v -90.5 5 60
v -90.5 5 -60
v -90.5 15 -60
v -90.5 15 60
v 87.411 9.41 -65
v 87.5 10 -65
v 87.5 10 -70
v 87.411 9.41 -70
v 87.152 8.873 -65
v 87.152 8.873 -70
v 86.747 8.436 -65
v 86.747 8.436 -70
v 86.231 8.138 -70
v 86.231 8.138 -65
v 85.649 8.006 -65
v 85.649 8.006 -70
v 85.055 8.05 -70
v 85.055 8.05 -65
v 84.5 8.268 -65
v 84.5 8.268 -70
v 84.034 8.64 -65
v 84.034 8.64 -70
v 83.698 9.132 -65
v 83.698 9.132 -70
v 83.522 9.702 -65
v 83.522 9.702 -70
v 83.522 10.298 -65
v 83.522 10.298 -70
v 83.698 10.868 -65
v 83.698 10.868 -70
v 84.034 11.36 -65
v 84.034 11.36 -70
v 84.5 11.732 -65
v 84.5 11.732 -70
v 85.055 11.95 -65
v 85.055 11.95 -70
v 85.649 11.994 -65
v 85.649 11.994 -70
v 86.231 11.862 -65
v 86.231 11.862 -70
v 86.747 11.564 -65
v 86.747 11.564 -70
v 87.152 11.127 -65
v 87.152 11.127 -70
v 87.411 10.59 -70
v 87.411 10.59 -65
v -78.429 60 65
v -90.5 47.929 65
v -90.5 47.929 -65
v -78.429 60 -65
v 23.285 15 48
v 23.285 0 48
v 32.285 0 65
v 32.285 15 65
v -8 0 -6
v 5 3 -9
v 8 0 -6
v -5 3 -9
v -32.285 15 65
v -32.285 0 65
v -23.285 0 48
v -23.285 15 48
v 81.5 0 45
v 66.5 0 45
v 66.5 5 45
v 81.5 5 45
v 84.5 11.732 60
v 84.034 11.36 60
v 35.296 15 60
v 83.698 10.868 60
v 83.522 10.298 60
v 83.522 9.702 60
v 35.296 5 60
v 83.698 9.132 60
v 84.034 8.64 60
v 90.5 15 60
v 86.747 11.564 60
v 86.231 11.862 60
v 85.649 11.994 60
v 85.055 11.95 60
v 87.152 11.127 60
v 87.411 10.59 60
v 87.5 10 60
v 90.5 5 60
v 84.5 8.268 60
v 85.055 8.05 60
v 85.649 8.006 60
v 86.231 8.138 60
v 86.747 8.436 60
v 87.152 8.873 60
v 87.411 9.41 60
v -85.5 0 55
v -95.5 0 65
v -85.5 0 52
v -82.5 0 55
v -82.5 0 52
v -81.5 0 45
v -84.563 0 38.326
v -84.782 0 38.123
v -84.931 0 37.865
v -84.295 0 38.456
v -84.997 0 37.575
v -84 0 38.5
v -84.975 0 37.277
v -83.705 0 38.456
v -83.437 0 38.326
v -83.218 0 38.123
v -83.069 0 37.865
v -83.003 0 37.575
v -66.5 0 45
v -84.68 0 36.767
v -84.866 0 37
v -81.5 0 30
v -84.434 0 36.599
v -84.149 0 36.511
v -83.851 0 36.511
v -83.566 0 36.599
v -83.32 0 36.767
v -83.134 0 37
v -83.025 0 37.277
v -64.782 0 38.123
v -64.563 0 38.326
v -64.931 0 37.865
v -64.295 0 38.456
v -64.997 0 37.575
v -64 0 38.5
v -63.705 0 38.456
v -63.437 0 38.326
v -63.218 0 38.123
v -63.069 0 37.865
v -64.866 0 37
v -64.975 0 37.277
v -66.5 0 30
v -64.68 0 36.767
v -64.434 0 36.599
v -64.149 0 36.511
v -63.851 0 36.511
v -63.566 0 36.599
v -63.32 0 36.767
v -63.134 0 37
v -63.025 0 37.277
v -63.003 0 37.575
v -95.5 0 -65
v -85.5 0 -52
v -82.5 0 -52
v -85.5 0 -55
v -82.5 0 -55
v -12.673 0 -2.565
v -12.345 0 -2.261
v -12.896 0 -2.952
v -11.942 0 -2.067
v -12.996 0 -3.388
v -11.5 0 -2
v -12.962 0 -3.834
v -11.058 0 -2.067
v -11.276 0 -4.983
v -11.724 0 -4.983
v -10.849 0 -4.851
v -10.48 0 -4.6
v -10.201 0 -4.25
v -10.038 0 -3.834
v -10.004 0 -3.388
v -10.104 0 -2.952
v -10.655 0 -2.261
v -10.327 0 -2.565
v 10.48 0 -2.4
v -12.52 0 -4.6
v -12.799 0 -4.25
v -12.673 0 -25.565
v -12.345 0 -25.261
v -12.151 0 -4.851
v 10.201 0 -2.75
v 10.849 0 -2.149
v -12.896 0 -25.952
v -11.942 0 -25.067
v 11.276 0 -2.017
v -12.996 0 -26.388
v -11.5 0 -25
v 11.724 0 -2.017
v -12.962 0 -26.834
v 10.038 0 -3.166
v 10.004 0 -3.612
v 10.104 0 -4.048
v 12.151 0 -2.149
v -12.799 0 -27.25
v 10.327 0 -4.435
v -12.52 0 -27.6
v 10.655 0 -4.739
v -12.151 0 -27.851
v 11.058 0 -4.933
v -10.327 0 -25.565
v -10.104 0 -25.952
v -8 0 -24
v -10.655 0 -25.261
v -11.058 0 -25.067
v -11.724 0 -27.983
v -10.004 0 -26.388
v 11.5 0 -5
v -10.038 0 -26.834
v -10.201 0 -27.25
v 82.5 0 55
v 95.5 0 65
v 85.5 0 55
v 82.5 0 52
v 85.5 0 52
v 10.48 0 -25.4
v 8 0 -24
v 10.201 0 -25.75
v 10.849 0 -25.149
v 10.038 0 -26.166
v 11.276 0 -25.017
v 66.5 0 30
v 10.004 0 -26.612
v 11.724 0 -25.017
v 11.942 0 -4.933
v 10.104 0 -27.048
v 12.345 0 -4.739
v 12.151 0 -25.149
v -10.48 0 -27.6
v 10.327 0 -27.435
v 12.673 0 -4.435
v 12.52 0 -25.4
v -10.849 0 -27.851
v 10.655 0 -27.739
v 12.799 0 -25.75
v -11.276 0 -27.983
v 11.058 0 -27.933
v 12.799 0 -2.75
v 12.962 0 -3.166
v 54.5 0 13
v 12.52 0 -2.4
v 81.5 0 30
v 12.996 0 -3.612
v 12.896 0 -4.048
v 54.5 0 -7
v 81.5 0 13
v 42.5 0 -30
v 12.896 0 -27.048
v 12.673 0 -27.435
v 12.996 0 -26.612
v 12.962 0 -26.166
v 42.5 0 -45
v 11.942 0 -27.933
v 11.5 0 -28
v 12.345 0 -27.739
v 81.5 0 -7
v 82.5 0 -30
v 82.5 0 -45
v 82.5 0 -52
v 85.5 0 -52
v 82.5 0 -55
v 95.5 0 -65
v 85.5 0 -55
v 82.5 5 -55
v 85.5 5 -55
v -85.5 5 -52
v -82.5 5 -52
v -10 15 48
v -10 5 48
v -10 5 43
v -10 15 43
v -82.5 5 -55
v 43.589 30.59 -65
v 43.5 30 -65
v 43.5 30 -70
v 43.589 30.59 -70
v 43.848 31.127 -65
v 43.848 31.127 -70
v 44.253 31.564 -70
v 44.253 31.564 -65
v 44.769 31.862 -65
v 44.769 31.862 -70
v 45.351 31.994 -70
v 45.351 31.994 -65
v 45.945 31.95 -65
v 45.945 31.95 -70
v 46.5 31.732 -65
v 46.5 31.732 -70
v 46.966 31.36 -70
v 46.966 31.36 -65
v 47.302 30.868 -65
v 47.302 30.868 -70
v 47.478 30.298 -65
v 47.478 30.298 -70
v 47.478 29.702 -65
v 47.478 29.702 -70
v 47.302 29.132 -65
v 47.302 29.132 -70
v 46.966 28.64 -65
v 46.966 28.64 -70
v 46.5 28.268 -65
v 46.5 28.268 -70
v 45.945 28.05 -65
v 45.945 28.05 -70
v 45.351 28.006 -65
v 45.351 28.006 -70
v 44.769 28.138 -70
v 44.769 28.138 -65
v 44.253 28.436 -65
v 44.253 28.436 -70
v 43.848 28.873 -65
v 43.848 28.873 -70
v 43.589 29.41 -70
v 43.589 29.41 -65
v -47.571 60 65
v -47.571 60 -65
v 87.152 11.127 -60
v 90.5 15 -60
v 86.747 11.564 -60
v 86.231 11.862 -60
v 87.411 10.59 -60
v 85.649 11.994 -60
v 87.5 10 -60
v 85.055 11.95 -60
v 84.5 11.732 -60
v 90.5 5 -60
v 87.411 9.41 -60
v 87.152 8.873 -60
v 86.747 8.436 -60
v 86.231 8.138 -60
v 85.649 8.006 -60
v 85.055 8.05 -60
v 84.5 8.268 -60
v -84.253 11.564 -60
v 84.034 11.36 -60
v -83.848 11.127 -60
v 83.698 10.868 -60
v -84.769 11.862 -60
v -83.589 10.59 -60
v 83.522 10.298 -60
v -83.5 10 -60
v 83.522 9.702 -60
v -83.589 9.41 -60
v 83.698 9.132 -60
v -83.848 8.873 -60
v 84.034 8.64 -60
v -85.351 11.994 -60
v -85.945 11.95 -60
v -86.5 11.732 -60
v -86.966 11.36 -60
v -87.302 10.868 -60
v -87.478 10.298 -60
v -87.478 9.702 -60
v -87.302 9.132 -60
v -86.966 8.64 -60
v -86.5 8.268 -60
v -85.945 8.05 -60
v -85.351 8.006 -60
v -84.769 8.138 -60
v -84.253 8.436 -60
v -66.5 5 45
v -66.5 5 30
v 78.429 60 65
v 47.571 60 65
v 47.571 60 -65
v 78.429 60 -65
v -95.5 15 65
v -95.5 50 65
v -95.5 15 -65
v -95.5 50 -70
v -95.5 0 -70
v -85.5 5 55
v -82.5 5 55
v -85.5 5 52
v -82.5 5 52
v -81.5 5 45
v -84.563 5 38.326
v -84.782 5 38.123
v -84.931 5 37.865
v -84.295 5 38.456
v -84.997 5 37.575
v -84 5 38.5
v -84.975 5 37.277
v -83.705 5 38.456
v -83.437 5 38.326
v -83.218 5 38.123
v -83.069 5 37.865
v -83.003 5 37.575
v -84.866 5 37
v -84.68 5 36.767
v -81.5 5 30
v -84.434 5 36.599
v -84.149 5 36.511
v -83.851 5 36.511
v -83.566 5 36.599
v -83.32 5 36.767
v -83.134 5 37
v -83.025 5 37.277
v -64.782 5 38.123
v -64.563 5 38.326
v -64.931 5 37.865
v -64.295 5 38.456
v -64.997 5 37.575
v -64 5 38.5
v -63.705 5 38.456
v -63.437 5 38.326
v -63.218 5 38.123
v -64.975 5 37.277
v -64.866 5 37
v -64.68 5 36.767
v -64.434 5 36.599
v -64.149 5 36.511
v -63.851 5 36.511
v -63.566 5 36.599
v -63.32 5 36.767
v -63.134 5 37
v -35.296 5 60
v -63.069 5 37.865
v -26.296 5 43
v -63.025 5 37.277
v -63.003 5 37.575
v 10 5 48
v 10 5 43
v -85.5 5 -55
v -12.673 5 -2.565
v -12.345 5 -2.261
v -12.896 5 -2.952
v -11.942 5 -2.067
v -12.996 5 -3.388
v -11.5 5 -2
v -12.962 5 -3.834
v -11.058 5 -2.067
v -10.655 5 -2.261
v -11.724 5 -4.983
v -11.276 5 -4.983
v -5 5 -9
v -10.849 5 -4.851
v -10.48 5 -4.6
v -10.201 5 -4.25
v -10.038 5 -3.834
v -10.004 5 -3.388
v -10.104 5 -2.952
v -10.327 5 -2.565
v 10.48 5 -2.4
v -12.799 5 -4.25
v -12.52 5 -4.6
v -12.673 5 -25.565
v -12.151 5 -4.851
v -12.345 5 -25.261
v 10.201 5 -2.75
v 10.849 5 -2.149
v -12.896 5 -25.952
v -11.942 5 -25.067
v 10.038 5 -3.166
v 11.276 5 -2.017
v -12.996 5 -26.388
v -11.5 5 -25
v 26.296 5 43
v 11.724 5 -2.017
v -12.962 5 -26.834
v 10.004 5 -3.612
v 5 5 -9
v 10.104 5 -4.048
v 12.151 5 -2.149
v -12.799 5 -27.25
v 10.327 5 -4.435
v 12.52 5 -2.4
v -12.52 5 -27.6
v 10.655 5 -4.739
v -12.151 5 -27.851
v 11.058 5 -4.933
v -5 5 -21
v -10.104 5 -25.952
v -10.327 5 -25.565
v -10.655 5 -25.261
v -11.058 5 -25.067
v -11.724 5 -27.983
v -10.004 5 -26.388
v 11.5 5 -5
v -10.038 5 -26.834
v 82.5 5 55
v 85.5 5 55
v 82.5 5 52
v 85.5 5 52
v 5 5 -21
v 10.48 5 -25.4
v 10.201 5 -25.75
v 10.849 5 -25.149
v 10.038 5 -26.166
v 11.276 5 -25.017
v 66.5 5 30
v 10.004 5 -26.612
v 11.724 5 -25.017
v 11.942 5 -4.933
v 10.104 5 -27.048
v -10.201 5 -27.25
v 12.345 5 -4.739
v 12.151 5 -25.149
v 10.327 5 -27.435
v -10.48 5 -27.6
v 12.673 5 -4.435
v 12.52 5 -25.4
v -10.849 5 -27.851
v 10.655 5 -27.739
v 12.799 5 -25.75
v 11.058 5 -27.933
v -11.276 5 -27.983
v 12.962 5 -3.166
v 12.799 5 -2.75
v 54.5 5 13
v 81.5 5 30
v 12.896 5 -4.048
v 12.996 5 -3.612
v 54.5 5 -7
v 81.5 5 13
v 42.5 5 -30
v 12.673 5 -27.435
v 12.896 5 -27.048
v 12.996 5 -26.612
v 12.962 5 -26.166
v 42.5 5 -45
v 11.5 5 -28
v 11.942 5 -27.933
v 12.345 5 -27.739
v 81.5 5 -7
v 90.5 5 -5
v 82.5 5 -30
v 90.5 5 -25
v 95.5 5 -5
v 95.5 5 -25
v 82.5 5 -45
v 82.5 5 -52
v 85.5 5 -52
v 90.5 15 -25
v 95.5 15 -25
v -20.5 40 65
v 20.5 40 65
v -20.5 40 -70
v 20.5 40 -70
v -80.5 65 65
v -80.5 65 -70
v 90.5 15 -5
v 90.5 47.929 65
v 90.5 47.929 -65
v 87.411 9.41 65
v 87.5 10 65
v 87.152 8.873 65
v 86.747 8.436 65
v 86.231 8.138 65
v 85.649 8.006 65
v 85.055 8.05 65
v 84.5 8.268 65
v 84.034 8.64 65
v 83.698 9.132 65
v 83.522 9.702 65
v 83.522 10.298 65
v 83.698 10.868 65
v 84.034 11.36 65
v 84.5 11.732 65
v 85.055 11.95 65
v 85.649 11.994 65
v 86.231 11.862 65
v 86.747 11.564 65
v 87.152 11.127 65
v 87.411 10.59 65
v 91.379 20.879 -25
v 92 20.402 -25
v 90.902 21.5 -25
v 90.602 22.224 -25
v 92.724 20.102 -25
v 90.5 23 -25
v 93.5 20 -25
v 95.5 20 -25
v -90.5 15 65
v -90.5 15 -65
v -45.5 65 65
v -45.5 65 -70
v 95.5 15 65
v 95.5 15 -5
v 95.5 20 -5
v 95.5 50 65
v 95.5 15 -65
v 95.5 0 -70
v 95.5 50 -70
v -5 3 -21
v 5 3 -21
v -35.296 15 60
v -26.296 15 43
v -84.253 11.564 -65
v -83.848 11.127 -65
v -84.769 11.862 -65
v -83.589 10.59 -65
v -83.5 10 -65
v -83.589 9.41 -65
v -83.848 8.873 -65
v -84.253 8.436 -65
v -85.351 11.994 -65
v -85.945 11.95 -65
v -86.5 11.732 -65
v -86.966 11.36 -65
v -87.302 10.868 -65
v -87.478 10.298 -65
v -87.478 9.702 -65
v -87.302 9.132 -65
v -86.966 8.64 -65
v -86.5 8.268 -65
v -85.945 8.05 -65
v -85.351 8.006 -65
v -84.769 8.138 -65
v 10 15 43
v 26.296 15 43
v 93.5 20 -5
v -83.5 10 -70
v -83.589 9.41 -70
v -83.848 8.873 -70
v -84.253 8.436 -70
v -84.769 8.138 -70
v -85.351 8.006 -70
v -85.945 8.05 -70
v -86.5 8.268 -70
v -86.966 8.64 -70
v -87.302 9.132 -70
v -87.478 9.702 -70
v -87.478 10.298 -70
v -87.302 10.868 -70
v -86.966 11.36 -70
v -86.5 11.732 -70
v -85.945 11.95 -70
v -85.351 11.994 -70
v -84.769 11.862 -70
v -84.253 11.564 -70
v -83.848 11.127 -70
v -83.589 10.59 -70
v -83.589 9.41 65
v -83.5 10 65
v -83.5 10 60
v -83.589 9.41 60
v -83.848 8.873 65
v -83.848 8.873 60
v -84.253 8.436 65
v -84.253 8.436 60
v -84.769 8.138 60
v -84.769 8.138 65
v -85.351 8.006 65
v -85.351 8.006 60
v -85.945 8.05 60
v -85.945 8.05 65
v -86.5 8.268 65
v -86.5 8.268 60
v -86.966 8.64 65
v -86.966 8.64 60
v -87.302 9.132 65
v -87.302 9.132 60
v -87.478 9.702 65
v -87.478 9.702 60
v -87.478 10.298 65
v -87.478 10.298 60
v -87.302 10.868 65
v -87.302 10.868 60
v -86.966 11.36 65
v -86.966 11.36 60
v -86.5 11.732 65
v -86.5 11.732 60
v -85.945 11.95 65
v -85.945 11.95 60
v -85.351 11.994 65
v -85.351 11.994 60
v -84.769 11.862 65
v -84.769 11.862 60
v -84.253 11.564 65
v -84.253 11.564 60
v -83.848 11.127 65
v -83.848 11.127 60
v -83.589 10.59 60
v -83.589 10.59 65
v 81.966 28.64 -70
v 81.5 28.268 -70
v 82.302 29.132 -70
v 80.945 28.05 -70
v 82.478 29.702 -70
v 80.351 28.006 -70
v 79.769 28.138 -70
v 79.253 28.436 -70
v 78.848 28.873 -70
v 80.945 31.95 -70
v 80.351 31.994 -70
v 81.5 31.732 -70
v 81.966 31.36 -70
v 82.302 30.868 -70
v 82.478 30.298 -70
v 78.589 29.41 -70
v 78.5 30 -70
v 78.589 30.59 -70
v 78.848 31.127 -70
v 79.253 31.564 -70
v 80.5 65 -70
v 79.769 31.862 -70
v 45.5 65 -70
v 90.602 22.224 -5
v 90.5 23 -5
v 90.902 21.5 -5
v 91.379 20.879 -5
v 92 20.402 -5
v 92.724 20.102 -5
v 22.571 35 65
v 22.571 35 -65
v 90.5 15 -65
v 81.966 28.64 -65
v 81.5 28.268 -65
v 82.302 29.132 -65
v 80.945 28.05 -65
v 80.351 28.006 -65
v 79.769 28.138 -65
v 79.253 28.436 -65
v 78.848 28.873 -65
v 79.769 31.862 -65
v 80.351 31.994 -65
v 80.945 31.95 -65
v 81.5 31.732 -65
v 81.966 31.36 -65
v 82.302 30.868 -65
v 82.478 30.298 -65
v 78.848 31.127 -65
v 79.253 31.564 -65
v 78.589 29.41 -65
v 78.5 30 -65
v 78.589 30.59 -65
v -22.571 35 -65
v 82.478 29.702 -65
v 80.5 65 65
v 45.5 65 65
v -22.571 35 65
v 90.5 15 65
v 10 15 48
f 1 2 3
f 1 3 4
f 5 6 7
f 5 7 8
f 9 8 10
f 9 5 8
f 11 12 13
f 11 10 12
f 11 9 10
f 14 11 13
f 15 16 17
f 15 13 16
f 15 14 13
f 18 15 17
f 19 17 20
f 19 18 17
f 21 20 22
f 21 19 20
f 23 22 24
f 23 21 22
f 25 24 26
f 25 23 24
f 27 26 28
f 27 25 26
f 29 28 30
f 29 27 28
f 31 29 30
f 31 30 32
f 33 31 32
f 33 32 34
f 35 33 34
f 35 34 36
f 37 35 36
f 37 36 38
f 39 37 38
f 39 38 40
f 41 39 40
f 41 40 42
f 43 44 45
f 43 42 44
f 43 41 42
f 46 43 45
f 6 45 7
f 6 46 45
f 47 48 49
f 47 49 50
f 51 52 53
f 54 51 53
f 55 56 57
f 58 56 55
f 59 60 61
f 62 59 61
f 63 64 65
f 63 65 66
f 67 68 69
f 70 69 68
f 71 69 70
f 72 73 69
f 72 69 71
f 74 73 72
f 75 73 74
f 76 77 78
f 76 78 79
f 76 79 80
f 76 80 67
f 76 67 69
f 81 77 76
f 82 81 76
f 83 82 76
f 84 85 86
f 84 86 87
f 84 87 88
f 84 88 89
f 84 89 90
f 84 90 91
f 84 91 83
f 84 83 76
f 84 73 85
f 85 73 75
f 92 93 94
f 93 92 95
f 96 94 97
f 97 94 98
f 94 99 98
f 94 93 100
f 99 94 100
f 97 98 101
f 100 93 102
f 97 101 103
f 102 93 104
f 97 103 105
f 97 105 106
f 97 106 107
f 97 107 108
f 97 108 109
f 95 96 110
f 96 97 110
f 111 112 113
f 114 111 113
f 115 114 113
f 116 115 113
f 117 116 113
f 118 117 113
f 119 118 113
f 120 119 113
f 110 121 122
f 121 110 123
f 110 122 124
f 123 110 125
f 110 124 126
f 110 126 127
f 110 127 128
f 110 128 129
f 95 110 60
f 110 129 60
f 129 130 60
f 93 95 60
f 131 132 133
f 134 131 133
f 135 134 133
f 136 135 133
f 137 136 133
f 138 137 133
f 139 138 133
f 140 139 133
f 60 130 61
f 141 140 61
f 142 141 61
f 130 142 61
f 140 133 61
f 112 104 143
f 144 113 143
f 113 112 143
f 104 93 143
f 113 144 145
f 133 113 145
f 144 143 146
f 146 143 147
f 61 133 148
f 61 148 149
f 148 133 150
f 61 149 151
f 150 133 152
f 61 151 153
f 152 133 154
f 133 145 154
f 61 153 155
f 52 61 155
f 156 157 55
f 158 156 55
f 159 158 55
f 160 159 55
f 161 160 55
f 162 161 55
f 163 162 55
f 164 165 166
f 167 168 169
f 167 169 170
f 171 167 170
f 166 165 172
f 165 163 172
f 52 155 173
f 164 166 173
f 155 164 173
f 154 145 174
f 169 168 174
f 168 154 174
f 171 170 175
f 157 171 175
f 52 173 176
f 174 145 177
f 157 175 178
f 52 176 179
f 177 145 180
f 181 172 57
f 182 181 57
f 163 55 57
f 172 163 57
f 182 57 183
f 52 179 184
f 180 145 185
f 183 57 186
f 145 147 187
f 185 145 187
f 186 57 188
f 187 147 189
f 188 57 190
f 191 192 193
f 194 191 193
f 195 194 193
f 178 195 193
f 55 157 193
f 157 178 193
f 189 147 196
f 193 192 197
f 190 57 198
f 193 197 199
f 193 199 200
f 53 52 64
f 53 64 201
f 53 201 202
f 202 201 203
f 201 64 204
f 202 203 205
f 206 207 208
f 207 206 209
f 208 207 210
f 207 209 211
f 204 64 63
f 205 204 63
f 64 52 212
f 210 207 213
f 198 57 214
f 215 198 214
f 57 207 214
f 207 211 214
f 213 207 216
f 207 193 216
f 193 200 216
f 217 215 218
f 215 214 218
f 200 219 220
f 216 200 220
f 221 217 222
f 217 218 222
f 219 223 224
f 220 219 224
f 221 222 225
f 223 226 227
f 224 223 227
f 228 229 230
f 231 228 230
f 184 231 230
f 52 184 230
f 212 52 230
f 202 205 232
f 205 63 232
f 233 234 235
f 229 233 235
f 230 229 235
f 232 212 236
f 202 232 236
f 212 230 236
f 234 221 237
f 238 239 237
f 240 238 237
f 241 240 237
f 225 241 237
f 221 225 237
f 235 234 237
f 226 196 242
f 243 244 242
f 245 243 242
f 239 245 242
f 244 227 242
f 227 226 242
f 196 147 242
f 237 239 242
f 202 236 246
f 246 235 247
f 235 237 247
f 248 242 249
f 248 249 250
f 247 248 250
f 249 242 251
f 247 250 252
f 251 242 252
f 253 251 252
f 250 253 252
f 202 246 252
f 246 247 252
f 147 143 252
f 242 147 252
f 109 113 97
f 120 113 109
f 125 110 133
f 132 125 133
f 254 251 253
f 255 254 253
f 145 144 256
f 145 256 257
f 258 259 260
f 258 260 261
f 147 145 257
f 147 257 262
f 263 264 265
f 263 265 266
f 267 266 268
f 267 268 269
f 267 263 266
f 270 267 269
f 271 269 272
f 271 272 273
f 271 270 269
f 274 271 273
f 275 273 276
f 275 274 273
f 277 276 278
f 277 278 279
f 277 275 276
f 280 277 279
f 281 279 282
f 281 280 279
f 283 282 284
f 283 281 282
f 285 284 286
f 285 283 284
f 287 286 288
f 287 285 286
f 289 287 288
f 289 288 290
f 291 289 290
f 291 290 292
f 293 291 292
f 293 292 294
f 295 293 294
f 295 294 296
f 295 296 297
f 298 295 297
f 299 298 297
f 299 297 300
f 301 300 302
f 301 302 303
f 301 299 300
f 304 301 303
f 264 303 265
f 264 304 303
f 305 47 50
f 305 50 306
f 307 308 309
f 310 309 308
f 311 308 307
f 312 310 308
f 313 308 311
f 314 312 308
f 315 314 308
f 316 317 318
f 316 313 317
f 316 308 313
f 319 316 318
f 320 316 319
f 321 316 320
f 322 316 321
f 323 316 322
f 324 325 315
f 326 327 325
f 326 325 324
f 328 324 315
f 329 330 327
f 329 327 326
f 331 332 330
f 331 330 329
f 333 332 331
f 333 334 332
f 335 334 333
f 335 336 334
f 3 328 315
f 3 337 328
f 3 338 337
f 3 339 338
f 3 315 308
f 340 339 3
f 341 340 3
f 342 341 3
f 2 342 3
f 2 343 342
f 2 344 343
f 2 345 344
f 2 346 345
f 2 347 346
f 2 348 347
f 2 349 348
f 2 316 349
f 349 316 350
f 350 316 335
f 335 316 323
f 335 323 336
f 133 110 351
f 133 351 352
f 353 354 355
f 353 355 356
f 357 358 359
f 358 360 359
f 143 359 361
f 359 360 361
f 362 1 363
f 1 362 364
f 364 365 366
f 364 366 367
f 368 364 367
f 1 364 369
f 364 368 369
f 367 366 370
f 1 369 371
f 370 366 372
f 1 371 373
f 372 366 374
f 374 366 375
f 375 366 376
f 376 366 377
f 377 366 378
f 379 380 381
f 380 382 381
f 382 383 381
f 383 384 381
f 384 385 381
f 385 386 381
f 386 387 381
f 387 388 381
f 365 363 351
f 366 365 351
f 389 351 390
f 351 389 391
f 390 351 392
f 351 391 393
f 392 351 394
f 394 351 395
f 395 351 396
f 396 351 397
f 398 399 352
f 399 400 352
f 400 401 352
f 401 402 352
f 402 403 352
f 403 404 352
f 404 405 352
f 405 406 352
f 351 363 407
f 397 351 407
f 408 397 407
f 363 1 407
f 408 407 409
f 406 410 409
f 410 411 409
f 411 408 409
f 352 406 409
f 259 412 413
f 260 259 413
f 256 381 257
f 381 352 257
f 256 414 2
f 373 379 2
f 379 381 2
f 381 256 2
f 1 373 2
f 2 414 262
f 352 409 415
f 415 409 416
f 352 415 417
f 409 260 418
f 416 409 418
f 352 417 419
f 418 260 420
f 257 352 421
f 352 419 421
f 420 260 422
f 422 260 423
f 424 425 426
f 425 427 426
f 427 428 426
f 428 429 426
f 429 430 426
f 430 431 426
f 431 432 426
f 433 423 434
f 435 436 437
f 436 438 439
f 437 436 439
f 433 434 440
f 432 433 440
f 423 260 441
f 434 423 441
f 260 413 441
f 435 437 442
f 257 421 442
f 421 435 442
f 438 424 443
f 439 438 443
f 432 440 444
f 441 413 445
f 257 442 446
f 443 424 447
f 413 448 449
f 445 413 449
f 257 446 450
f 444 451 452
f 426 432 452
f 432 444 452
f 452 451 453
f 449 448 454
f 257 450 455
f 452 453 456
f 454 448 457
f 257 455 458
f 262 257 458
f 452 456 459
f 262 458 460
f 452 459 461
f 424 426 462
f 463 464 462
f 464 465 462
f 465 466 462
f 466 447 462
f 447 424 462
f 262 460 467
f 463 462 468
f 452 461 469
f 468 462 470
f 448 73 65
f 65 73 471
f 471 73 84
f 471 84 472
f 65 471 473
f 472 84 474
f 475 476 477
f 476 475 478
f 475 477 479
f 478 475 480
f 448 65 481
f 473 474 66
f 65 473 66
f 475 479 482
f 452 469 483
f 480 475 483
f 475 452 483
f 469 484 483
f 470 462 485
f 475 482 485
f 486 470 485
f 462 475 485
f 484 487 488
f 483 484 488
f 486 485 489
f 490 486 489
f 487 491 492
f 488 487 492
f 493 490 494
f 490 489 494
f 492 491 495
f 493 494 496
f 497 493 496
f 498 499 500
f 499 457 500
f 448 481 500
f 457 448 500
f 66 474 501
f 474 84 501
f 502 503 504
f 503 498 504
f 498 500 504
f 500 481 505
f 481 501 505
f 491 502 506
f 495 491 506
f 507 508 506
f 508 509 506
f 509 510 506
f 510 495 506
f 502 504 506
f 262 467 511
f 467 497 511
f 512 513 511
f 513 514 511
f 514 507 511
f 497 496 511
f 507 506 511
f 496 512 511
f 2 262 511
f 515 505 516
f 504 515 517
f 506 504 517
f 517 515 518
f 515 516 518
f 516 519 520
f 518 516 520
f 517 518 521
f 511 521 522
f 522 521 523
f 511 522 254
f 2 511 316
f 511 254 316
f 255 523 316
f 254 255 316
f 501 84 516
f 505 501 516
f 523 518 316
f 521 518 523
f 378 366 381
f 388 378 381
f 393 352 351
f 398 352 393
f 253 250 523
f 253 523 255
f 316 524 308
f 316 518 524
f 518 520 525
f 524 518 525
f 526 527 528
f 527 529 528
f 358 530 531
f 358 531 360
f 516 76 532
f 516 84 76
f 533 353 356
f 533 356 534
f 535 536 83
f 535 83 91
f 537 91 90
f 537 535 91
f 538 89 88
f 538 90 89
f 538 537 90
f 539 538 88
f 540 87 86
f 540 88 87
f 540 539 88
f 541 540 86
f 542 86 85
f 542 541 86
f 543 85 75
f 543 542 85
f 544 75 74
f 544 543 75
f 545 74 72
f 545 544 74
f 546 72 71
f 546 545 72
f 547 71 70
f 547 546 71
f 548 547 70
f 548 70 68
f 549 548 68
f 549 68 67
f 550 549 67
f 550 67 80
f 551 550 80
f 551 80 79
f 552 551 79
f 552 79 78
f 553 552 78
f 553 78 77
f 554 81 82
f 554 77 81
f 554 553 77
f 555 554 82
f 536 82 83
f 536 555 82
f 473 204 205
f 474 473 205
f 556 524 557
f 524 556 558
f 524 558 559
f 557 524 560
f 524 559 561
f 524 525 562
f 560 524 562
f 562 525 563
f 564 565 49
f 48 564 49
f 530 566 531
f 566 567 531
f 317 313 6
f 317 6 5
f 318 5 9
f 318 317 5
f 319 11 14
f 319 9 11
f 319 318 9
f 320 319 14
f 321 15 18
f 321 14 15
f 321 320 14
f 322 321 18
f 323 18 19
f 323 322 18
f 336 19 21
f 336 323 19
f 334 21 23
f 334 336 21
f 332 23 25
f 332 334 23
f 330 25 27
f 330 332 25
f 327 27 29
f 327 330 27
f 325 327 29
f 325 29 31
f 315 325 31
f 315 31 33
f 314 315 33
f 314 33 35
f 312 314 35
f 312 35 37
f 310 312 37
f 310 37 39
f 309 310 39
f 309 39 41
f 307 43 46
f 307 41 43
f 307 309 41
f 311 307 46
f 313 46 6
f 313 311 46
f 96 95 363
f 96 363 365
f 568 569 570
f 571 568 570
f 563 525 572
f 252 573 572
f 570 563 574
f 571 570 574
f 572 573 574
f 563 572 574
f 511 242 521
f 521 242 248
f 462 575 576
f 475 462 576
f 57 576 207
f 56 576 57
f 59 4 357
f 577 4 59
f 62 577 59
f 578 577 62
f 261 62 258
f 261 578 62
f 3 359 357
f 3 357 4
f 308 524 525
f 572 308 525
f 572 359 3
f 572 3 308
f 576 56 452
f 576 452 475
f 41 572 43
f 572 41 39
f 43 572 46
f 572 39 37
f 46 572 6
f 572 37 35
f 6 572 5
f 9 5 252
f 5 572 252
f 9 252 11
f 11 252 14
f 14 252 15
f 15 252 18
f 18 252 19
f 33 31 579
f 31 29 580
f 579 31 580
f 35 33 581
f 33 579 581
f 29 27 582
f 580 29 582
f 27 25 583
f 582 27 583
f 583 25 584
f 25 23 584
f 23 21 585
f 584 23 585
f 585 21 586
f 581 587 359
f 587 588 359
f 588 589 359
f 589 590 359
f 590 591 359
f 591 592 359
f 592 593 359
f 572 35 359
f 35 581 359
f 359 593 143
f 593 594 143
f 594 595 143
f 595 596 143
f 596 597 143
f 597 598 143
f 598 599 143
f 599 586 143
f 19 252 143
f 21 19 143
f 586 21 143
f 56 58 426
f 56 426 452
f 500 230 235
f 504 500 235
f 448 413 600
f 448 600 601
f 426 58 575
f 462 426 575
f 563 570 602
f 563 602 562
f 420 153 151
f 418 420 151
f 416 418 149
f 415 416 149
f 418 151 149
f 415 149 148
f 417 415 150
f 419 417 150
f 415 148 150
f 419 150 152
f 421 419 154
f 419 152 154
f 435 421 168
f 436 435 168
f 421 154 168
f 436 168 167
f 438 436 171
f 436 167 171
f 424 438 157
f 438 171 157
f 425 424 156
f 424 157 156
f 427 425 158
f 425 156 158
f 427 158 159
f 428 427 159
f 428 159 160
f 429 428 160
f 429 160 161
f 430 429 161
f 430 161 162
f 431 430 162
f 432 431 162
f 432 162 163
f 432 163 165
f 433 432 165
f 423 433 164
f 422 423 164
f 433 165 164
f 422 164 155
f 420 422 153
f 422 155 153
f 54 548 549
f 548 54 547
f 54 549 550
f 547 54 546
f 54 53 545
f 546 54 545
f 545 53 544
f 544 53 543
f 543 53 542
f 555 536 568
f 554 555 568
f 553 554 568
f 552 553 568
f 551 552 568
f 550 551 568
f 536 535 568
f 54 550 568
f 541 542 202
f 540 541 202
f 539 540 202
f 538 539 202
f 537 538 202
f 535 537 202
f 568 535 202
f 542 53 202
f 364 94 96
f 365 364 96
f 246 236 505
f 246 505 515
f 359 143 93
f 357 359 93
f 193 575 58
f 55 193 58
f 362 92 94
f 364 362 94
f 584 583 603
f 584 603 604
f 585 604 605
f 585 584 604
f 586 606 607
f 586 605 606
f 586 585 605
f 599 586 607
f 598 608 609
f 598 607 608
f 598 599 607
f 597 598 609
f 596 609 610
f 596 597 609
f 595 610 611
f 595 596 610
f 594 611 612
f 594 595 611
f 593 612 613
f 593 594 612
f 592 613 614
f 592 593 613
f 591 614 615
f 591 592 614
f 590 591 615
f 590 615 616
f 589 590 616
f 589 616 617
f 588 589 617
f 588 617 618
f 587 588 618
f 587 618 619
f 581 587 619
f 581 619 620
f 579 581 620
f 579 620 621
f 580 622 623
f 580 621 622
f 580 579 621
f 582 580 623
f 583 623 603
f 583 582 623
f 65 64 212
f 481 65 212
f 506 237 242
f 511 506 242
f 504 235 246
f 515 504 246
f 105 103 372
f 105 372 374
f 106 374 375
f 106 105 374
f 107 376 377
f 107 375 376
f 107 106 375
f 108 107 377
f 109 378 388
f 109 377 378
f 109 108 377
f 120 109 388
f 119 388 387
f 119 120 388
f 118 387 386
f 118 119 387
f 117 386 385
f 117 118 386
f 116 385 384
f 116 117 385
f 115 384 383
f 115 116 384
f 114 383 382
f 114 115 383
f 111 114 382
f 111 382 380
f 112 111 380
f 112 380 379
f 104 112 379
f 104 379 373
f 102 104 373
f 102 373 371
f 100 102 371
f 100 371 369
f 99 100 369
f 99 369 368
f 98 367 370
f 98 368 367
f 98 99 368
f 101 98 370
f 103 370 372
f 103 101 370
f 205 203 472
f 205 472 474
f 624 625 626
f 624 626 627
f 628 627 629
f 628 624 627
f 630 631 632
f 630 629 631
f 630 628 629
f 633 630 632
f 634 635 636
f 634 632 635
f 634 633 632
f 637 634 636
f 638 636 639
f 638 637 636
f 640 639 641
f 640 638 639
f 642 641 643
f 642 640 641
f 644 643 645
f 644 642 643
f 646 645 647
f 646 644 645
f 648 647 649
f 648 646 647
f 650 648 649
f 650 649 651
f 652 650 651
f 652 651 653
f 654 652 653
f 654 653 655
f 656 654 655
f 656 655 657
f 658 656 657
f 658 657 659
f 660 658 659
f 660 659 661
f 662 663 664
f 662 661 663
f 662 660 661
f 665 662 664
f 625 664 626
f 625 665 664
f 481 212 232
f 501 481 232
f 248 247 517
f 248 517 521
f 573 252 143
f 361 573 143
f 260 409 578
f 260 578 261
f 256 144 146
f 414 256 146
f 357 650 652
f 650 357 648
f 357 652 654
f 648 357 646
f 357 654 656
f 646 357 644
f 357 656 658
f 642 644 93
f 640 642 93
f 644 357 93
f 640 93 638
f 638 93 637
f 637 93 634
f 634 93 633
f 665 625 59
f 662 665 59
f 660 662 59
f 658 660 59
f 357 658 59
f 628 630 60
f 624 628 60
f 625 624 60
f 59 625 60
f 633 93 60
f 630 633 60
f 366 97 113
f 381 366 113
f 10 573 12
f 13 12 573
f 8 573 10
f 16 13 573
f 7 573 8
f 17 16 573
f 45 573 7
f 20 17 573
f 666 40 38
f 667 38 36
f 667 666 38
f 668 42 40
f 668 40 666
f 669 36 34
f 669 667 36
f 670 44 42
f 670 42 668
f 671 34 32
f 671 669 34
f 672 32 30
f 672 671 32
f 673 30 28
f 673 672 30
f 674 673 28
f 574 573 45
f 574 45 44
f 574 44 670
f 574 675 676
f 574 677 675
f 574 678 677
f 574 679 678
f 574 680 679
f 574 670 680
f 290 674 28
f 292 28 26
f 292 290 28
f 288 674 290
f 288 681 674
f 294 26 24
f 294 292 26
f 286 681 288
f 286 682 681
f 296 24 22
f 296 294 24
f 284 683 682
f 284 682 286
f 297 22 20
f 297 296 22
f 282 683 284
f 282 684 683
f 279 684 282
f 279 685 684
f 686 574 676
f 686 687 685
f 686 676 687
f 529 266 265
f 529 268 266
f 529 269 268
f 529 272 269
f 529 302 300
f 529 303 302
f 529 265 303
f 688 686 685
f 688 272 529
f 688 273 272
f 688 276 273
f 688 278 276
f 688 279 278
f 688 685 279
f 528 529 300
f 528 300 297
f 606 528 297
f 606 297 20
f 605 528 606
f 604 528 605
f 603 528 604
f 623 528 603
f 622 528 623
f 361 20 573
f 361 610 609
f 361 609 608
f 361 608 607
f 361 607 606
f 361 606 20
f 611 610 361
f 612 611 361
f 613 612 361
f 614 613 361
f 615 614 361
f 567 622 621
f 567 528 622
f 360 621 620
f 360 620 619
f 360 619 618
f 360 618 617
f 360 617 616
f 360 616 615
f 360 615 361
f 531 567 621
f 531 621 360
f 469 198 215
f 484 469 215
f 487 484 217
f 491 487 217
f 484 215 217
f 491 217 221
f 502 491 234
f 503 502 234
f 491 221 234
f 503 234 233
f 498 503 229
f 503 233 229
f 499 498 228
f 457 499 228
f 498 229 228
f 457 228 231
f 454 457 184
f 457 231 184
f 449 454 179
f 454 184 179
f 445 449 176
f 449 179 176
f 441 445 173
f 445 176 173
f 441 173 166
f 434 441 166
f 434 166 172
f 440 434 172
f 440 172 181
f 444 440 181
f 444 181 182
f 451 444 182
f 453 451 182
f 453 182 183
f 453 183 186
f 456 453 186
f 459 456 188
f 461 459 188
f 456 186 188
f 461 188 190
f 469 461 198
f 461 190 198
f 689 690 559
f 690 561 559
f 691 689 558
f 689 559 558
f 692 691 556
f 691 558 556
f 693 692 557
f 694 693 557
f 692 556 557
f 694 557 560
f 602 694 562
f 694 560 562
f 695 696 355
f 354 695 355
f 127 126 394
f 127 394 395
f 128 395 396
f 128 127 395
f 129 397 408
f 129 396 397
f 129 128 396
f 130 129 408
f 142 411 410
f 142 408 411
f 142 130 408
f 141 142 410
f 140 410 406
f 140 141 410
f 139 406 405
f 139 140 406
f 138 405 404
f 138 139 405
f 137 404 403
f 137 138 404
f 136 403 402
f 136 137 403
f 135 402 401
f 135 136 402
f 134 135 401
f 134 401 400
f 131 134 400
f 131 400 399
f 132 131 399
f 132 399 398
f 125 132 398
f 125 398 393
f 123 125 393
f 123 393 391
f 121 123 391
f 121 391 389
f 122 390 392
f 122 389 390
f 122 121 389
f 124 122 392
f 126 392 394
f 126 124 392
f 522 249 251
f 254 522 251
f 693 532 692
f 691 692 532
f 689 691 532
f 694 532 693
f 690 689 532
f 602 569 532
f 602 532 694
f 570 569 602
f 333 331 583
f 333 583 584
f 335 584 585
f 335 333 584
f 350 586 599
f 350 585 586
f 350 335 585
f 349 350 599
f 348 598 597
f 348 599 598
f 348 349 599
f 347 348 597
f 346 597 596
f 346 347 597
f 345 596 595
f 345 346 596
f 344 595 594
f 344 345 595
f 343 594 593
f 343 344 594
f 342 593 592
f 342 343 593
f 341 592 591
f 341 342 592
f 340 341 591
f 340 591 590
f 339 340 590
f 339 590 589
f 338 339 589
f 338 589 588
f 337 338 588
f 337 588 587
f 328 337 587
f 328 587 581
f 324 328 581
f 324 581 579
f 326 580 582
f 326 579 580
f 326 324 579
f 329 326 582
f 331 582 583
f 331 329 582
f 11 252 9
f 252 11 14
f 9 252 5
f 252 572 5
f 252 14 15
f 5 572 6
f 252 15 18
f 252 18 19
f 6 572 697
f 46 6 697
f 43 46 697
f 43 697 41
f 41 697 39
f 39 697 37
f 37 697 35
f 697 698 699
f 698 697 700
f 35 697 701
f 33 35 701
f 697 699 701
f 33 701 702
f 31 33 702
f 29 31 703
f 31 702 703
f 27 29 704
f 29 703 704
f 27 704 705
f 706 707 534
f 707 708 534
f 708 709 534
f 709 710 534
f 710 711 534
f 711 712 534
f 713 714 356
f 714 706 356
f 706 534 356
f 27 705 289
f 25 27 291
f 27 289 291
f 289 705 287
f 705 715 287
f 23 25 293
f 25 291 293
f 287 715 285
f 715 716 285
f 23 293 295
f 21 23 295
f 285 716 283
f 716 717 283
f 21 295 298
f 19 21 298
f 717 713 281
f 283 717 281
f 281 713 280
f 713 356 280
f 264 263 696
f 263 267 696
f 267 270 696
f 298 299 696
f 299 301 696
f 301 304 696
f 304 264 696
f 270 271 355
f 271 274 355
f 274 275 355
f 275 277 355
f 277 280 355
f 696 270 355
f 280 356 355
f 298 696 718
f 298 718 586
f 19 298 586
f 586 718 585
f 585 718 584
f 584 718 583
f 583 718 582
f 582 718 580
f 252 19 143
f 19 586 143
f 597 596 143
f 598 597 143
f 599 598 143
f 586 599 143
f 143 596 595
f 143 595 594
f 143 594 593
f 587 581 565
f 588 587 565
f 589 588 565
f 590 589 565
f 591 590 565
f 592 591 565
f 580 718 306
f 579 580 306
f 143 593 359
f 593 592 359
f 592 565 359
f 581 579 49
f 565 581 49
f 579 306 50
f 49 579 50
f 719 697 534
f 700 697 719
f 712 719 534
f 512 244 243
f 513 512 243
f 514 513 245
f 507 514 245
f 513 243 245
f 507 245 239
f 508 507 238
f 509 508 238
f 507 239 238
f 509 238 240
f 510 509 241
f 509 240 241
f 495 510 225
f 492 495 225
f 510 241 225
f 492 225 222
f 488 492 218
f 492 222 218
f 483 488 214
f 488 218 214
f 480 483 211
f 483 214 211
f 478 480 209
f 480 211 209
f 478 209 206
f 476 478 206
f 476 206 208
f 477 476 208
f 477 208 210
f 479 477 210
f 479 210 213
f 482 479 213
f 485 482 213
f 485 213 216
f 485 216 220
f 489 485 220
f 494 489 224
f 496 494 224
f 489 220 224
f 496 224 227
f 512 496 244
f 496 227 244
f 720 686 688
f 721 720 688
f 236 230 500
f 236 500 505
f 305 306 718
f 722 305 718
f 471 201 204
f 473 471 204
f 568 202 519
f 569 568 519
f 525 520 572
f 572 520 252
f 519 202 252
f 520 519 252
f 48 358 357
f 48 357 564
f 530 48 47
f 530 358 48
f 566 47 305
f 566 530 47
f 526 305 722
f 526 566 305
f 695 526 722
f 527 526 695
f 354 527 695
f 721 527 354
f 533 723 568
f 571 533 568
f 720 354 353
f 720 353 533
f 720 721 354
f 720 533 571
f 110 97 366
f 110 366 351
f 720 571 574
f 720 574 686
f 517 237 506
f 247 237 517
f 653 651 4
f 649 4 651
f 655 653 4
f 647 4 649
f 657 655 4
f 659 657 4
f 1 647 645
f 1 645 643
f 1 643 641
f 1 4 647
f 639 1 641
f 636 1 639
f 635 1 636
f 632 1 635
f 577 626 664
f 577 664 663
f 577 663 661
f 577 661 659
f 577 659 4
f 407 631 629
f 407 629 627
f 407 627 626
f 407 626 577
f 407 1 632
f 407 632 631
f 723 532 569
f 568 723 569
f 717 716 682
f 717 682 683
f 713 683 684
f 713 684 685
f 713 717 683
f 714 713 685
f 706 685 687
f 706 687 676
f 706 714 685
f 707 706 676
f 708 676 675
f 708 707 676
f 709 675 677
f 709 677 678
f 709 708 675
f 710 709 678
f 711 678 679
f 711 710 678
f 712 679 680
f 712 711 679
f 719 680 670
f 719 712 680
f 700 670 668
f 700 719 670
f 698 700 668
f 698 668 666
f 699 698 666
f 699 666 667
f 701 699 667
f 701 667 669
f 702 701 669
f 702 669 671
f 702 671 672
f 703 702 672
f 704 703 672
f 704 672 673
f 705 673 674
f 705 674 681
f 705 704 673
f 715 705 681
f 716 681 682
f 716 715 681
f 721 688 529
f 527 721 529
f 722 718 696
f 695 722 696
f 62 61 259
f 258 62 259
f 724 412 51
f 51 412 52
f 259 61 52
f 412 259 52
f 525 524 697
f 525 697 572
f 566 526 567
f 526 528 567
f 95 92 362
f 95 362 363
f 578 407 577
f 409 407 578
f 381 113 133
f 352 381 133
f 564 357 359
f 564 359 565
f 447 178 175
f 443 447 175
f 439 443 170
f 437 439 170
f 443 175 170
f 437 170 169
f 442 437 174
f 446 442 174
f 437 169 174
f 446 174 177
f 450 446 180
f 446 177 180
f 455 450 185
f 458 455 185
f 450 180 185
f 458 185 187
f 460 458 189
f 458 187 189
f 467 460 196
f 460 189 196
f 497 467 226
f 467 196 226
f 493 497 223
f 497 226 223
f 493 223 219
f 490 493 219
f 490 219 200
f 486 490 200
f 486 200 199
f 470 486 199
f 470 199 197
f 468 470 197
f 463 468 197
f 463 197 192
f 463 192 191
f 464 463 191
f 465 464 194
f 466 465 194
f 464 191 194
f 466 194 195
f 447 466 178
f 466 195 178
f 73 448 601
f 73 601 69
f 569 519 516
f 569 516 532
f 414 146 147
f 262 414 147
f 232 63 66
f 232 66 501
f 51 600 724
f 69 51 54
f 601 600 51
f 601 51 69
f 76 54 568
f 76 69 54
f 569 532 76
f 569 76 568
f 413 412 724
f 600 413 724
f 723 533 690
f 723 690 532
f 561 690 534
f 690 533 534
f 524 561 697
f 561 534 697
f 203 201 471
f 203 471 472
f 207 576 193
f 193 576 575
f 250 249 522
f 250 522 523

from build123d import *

# Parameters (mm, degrees)
BOSS_EXTRUDE2_DEPTH     = 15
SHELL1_T                = -5
CUT_EXTRUDE2_DEPTH      = 117.491415993
CUT_EXTRUDE2_DEPTH_BACK = 117.491415993
SKETCH4_R               = 1
SKETCH4_W               = 10
SKETCH4_H               = 12
SKETCH4_W_2             = 27
SKETCH4_H_2             = 20
SKETCH4_W_3             = 15
SKETCH4_H_3             = 15
SKETCH4_W_4             = 40
SKETCH5_W               = 3
SKETCH5_H               = 3
CUT_EXTRUDE4_DEPTH      = 117.491415993
SKETCH6_R               = 2
BOSS_EXTRUDE3_DEPTH     = 5
CUT_EXTRUDE5_DEPTH      = 178.68019023
CUT_EXTRUDE5_DEPTH_BACK = 178.68019023
SKETCH7_R               = 2
BOSS_EXTRUDE4_DEPTH     = 130
CHAMFER2_SIZE           = 3
SKETCH10_R              = 1.5
CUT_EXTRUDE6_DEPTH      = 5
SKETCH11_W              = 20
SKETCH11_H              = 10
CUT_EXTRUDE7_DEPTH      = 5
SKETCH12_W              = 20
SKETCH12_H              = 15
CUT_EXTRUDE8_DEPTH      = 6
FILLET1_R               = 3


with BuildPart() as part:
    # Sketch3 → Boss-Extrude2 (new body)
    with BuildSketch(Plane(origin=(0, 0, 0), x_dir=(1, 0, 0), z_dir=(0, 1, 0))):
        Polygon((95.5, 65), (-95.5, 65), (-95.5, -65), (-32.285430092, -65), (-23.285430092, -48), (23.285430092, -48), (32.285430092, -65), (95.5, -65), align=None)
    extrude(amount=BOSS_EXTRUDE2_DEPTH)

    # Shell1
    shell1_openings = [part.faces().sort_by_distance(p)[0] for p in [
        (0, 15, -2.252821678),
    ]]
    offset(amount=SHELL1_T, openings=shell1_openings, kind=Kind.INTERSECTION)

    # Sketch4 → Cut-Extrude2 (cut, two sides: drawn at the far end of the back side and taken through both)
    with BuildSketch(Plane(origin=(0, 0, 0), x_dir=(1, 0, 0), z_dir=(0, 1, 0)).offset(-CUT_EXTRUDE2_DEPTH_BACK)):
        with Locations(Location((-84, -37.5, 0), (0, 0, 270))):
            Circle(SKETCH4_R)
        with Locations(Location((-64, -37.5, 0), (0, 0, 270))):
            Circle(SKETCH4_R)
        with Locations((0, 15)):
            Rectangle(SKETCH4_W, SKETCH4_H)
        with Locations((68, -3)):
            Rectangle(SKETCH4_W_2, SKETCH4_H_2)
        with Locations((74, -37.5)):
            Rectangle(SKETCH4_W_3, SKETCH4_H_3)
        with Locations((-74, -37.5)):
            Rectangle(SKETCH4_W_3, SKETCH4_H_3)
        with Locations((62.5, 37.5)):
            Rectangle(SKETCH4_W_4, SKETCH4_H_3)
    extrude(amount=CUT_EXTRUDE2_DEPTH + CUT_EXTRUDE2_DEPTH_BACK, mode=Mode.SUBTRACT)

    # Sketch5 → Cut-Extrude4 (cut, through all)
    with BuildSketch(Plane(origin=(0, 0, 0), x_dir=(1, 0, 0), z_dir=(0, 1, 0))):
        with Locations((-84, 53.5)):
            Rectangle(SKETCH5_W, SKETCH5_H)
        with Locations((84, 53.5)):
            Rectangle(SKETCH5_W, SKETCH5_H)
        with Locations((84, -53.5)):
            Rectangle(SKETCH5_W, SKETCH5_H)
        with Locations((-84, -53.5)):
            Rectangle(SKETCH5_W, SKETCH5_H)
    extrude(amount=CUT_EXTRUDE4_DEPTH, mode=Mode.SUBTRACT)


with BuildPart() as body_2:
    # Sketch6 → Boss-Extrude3 (new body)
    with BuildSketch(Plane(origin=(0, 0, -65), x_dir=(-1, 0, 0), z_dir=(0, 0, -1))):
        Polygon((-95.5, 50), (-95.5, 0), (95.5, 0), (95.5, 50), (80.5, 65), (45.5, 65), (20.5, 40), (-20.5, 40), (-45.5, 65), (-80.5, 65), align=None)
        with Locations((-80.5, 30)):
            Circle(SKETCH6_R, mode=Mode.SUBTRACT)
        with Locations((-45.5, 30)):
            Circle(SKETCH6_R, mode=Mode.SUBTRACT)
    extrude(amount=BOSS_EXTRUDE3_DEPTH)


with BuildPart() as cut_extrude5_tool:
    # Sketch7 → Cut-Extrude5 (new, two sides: drawn at the far end of the back side and taken through both)
    with BuildSketch(Plane(origin=(0, 0, -70), x_dir=(-1, 0, 0), z_dir=(0, 0, -1)).offset(-CUT_EXTRUDE5_DEPTH_BACK)):
        with Locations(Location((-85.5, 10, 0), (0, 0, 180))):
            Circle(SKETCH7_R)
        with Locations(Location((85.5, 10, 0), (0, 0, 180))):
            Circle(SKETCH7_R)
    extrude(amount=CUT_EXTRUDE5_DEPTH + CUT_EXTRUDE5_DEPTH_BACK)


with BuildPart() as part_1:
    add(part.part)

    # Cut-Extrude5: cut by cut_extrude5_tool
    add(cut_extrude5_tool.part, mode=Mode.SUBTRACT)

    # Chamfer2
    chamfer2_edges = [part_1.edges().sort_by_distance(p)[0] for p in [
        (-5, 0, -15),
        (0, 0, -21),
        (5, 0, -15),
        (0, 0, -9),
    ]]
    chamfer(chamfer2_edges, length=CHAMFER2_SIZE)

    # Sketch10 → Cut-Extrude6 (cut)
    with BuildSketch(Plane.XZ):
        with Locations(Location((11.5, -3.5, 0), (0, 0, 270))):
            Circle(SKETCH10_R)
        with Locations(Location((11.5, -26.5, 0), (0, 0, 270))):
            Circle(SKETCH10_R)
        with Locations(Location((-11.5, -26.5, 0), (0, 0, 90))):
            Circle(SKETCH10_R)
        with Locations(Location((-11.5, -3.5, 0), (0, 0, 90))):
            Circle(SKETCH10_R)
    extrude(amount=-CUT_EXTRUDE6_DEPTH, mode=Mode.SUBTRACT)

    # Sketch11 → Cut-Extrude7 (cut)
    with BuildSketch(Plane.XY.offset(48)):
        with Locations((0, 10)):
            Rectangle(SKETCH11_W, SKETCH11_H)
    extrude(amount=-CUT_EXTRUDE7_DEPTH, mode=Mode.SUBTRACT)


with BuildPart() as body_2_1:
    add(body_2.part)

    # Cut-Extrude5: cut by cut_extrude5_tool
    add(cut_extrude5_tool.part, mode=Mode.SUBTRACT)

    # Sketch8 → Boss-Extrude4 (add)
    with BuildSketch(Plane.XY.offset(-65)):
        Polygon((45.5, 65), (20.5, 40), (-20.5, 40), (-45.5, 65), (-80.5, 65), (-95.5, 50), (-95.5, 15), (-90.5, 15), (-90.5, 47.928932188), (-78.428932188, 60), (-47.571067812, 60), (-22.571067812, 35), (22.571067812, 35), (47.571067812, 60), (78.428932188, 60), (90.5, 47.928932188), (90.5, 15), (95.5, 15), (95.5, 50), (80.5, 65), align=None)
    extrude(amount=BOSS_EXTRUDE4_DEPTH)


with BuildPart() as cut_extrude8_tool:
    # Sketch12 → Cut-Extrude8 (new body)
    with BuildSketch(Plane(origin=(95.5, 0, 0), x_dir=(0, 0, -1), z_dir=(1, 0, 0))):
        with Locations((15, 12.5)):
            Rectangle(SKETCH12_W, SKETCH12_H)
    extrude(amount=-CUT_EXTRUDE8_DEPTH)


with BuildPart() as part_2:
    add(part_1.part)

    # Cut-Extrude8: cut by cut_extrude8_tool
    add(cut_extrude8_tool.part, mode=Mode.SUBTRACT)


with BuildPart() as body_2_2:
    add(body_2_1.part)

    # Cut-Extrude8: cut by cut_extrude8_tool
    add(cut_extrude8_tool.part, mode=Mode.SUBTRACT)

    # Fillet1
    fillet1_edges = [body_2_2.edges().sort_by_distance(p)[0] for p in [
        (90.5, 20, -15),
    ]]
    fillet(fillet1_edges, radius=FILLET1_R)


solid = Compound([part_2.part, body_2_2.part])
